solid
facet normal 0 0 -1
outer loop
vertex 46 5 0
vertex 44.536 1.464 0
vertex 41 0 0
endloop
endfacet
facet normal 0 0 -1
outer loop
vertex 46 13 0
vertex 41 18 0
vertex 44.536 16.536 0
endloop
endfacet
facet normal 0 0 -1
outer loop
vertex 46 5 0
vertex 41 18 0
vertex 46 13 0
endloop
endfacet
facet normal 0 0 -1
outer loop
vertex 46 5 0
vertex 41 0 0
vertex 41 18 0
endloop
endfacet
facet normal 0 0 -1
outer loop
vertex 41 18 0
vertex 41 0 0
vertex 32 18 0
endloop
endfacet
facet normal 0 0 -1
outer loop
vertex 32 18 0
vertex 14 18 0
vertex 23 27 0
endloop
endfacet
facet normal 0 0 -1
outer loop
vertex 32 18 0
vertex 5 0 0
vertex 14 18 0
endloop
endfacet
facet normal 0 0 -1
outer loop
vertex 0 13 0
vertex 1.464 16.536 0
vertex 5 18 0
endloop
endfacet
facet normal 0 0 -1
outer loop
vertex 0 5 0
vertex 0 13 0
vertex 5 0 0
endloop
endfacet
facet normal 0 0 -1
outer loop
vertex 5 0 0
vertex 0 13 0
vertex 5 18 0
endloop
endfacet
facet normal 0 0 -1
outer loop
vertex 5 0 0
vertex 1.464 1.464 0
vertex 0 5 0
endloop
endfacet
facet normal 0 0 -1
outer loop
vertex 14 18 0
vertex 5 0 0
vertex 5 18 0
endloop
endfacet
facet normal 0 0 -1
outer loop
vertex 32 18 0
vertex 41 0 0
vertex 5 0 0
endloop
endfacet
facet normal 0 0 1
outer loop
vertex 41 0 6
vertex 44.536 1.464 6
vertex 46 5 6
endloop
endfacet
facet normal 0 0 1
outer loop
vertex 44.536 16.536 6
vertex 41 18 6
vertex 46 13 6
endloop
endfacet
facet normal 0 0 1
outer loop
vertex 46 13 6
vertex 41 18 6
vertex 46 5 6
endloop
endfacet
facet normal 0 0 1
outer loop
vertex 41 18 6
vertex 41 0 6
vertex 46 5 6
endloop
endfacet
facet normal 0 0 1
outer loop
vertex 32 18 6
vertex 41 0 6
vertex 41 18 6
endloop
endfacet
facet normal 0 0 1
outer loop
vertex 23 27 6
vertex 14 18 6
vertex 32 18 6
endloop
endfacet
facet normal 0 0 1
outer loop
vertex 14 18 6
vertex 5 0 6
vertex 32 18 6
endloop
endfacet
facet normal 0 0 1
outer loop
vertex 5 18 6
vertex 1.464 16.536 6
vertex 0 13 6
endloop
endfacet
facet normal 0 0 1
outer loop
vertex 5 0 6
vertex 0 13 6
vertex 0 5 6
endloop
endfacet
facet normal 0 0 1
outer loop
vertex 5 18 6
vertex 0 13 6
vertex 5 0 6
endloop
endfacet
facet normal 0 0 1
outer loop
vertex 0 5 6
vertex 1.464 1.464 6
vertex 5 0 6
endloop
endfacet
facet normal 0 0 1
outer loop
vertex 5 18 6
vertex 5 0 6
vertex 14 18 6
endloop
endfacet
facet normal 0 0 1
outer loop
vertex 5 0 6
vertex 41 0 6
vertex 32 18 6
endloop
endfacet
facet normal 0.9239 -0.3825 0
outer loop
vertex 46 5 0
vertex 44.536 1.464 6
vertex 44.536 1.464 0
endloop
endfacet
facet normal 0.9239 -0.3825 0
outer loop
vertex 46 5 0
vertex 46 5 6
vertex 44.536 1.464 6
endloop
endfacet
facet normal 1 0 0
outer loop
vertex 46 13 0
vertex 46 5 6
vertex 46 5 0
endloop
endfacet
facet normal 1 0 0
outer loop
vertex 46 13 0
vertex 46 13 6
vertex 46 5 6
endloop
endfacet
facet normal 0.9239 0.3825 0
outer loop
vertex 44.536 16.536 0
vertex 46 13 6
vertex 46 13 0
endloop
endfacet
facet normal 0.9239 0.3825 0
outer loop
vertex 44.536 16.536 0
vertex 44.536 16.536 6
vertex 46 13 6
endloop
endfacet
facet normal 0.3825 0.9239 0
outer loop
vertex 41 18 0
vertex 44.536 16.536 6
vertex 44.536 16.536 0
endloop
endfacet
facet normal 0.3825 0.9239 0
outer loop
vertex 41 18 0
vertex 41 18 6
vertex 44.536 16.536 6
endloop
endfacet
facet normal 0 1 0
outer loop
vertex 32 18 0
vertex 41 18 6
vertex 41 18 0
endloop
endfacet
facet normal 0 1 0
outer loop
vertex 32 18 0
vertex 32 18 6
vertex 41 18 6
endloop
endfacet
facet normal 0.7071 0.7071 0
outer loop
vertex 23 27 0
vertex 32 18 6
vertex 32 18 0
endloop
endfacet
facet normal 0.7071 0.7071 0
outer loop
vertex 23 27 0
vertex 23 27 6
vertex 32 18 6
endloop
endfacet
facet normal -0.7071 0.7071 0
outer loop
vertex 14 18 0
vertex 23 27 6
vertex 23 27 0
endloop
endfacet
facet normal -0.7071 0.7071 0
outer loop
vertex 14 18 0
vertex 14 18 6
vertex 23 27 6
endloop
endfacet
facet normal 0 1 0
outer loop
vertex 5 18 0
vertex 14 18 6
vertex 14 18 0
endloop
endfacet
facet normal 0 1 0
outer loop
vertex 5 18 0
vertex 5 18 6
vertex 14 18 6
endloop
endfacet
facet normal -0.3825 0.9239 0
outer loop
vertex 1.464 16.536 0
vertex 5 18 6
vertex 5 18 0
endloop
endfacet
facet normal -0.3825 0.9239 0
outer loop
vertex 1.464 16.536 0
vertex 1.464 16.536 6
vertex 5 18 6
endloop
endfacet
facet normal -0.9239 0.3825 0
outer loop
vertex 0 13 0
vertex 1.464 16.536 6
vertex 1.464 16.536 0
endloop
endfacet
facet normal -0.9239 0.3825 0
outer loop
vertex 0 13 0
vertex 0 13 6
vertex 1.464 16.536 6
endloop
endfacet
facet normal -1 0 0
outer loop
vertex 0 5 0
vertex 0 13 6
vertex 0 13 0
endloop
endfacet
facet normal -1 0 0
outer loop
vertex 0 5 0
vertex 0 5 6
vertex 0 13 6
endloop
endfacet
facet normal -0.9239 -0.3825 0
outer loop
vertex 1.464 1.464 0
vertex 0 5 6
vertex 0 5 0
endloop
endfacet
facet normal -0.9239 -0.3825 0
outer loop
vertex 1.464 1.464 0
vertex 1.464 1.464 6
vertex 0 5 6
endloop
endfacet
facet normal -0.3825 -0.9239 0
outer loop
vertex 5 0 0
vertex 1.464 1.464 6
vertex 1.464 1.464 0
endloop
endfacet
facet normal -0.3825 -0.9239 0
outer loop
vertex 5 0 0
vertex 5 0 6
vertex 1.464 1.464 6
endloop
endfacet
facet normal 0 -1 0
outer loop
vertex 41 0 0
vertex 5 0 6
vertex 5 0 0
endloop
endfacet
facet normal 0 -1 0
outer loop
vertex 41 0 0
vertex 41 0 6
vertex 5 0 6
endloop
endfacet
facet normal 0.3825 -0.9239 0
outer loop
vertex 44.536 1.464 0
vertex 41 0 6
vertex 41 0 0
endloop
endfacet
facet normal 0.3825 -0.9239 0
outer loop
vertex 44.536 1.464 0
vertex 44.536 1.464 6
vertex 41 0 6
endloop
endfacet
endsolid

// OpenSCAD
$fn = 32;

// ----------------------------------------------------------------------
// Ratchet pawl: 46 x 18 mm body, beak 9 mm сверху
// ----------------------------------------------------------------------

// --- parameters (mm) ---
profile_height = 6;       // extrusion height
profile_points = 15;      // points of the closed outline

profile = [[0, 5], [1.464, 1.464], [5, 0], [41, 0], [44.536, 1.464], [46, 5], [46, 13], [44.536, 16.536], [41, 18], [32, 18], [23, 27], [14, 18], [5, 18], [1.464, 16.536], [0, 13]];  // single closed polygon, 15 points, counter clockwise

// --- the one profile operation ---
linear_extrude(height = profile_height) polygon(points = profile);
